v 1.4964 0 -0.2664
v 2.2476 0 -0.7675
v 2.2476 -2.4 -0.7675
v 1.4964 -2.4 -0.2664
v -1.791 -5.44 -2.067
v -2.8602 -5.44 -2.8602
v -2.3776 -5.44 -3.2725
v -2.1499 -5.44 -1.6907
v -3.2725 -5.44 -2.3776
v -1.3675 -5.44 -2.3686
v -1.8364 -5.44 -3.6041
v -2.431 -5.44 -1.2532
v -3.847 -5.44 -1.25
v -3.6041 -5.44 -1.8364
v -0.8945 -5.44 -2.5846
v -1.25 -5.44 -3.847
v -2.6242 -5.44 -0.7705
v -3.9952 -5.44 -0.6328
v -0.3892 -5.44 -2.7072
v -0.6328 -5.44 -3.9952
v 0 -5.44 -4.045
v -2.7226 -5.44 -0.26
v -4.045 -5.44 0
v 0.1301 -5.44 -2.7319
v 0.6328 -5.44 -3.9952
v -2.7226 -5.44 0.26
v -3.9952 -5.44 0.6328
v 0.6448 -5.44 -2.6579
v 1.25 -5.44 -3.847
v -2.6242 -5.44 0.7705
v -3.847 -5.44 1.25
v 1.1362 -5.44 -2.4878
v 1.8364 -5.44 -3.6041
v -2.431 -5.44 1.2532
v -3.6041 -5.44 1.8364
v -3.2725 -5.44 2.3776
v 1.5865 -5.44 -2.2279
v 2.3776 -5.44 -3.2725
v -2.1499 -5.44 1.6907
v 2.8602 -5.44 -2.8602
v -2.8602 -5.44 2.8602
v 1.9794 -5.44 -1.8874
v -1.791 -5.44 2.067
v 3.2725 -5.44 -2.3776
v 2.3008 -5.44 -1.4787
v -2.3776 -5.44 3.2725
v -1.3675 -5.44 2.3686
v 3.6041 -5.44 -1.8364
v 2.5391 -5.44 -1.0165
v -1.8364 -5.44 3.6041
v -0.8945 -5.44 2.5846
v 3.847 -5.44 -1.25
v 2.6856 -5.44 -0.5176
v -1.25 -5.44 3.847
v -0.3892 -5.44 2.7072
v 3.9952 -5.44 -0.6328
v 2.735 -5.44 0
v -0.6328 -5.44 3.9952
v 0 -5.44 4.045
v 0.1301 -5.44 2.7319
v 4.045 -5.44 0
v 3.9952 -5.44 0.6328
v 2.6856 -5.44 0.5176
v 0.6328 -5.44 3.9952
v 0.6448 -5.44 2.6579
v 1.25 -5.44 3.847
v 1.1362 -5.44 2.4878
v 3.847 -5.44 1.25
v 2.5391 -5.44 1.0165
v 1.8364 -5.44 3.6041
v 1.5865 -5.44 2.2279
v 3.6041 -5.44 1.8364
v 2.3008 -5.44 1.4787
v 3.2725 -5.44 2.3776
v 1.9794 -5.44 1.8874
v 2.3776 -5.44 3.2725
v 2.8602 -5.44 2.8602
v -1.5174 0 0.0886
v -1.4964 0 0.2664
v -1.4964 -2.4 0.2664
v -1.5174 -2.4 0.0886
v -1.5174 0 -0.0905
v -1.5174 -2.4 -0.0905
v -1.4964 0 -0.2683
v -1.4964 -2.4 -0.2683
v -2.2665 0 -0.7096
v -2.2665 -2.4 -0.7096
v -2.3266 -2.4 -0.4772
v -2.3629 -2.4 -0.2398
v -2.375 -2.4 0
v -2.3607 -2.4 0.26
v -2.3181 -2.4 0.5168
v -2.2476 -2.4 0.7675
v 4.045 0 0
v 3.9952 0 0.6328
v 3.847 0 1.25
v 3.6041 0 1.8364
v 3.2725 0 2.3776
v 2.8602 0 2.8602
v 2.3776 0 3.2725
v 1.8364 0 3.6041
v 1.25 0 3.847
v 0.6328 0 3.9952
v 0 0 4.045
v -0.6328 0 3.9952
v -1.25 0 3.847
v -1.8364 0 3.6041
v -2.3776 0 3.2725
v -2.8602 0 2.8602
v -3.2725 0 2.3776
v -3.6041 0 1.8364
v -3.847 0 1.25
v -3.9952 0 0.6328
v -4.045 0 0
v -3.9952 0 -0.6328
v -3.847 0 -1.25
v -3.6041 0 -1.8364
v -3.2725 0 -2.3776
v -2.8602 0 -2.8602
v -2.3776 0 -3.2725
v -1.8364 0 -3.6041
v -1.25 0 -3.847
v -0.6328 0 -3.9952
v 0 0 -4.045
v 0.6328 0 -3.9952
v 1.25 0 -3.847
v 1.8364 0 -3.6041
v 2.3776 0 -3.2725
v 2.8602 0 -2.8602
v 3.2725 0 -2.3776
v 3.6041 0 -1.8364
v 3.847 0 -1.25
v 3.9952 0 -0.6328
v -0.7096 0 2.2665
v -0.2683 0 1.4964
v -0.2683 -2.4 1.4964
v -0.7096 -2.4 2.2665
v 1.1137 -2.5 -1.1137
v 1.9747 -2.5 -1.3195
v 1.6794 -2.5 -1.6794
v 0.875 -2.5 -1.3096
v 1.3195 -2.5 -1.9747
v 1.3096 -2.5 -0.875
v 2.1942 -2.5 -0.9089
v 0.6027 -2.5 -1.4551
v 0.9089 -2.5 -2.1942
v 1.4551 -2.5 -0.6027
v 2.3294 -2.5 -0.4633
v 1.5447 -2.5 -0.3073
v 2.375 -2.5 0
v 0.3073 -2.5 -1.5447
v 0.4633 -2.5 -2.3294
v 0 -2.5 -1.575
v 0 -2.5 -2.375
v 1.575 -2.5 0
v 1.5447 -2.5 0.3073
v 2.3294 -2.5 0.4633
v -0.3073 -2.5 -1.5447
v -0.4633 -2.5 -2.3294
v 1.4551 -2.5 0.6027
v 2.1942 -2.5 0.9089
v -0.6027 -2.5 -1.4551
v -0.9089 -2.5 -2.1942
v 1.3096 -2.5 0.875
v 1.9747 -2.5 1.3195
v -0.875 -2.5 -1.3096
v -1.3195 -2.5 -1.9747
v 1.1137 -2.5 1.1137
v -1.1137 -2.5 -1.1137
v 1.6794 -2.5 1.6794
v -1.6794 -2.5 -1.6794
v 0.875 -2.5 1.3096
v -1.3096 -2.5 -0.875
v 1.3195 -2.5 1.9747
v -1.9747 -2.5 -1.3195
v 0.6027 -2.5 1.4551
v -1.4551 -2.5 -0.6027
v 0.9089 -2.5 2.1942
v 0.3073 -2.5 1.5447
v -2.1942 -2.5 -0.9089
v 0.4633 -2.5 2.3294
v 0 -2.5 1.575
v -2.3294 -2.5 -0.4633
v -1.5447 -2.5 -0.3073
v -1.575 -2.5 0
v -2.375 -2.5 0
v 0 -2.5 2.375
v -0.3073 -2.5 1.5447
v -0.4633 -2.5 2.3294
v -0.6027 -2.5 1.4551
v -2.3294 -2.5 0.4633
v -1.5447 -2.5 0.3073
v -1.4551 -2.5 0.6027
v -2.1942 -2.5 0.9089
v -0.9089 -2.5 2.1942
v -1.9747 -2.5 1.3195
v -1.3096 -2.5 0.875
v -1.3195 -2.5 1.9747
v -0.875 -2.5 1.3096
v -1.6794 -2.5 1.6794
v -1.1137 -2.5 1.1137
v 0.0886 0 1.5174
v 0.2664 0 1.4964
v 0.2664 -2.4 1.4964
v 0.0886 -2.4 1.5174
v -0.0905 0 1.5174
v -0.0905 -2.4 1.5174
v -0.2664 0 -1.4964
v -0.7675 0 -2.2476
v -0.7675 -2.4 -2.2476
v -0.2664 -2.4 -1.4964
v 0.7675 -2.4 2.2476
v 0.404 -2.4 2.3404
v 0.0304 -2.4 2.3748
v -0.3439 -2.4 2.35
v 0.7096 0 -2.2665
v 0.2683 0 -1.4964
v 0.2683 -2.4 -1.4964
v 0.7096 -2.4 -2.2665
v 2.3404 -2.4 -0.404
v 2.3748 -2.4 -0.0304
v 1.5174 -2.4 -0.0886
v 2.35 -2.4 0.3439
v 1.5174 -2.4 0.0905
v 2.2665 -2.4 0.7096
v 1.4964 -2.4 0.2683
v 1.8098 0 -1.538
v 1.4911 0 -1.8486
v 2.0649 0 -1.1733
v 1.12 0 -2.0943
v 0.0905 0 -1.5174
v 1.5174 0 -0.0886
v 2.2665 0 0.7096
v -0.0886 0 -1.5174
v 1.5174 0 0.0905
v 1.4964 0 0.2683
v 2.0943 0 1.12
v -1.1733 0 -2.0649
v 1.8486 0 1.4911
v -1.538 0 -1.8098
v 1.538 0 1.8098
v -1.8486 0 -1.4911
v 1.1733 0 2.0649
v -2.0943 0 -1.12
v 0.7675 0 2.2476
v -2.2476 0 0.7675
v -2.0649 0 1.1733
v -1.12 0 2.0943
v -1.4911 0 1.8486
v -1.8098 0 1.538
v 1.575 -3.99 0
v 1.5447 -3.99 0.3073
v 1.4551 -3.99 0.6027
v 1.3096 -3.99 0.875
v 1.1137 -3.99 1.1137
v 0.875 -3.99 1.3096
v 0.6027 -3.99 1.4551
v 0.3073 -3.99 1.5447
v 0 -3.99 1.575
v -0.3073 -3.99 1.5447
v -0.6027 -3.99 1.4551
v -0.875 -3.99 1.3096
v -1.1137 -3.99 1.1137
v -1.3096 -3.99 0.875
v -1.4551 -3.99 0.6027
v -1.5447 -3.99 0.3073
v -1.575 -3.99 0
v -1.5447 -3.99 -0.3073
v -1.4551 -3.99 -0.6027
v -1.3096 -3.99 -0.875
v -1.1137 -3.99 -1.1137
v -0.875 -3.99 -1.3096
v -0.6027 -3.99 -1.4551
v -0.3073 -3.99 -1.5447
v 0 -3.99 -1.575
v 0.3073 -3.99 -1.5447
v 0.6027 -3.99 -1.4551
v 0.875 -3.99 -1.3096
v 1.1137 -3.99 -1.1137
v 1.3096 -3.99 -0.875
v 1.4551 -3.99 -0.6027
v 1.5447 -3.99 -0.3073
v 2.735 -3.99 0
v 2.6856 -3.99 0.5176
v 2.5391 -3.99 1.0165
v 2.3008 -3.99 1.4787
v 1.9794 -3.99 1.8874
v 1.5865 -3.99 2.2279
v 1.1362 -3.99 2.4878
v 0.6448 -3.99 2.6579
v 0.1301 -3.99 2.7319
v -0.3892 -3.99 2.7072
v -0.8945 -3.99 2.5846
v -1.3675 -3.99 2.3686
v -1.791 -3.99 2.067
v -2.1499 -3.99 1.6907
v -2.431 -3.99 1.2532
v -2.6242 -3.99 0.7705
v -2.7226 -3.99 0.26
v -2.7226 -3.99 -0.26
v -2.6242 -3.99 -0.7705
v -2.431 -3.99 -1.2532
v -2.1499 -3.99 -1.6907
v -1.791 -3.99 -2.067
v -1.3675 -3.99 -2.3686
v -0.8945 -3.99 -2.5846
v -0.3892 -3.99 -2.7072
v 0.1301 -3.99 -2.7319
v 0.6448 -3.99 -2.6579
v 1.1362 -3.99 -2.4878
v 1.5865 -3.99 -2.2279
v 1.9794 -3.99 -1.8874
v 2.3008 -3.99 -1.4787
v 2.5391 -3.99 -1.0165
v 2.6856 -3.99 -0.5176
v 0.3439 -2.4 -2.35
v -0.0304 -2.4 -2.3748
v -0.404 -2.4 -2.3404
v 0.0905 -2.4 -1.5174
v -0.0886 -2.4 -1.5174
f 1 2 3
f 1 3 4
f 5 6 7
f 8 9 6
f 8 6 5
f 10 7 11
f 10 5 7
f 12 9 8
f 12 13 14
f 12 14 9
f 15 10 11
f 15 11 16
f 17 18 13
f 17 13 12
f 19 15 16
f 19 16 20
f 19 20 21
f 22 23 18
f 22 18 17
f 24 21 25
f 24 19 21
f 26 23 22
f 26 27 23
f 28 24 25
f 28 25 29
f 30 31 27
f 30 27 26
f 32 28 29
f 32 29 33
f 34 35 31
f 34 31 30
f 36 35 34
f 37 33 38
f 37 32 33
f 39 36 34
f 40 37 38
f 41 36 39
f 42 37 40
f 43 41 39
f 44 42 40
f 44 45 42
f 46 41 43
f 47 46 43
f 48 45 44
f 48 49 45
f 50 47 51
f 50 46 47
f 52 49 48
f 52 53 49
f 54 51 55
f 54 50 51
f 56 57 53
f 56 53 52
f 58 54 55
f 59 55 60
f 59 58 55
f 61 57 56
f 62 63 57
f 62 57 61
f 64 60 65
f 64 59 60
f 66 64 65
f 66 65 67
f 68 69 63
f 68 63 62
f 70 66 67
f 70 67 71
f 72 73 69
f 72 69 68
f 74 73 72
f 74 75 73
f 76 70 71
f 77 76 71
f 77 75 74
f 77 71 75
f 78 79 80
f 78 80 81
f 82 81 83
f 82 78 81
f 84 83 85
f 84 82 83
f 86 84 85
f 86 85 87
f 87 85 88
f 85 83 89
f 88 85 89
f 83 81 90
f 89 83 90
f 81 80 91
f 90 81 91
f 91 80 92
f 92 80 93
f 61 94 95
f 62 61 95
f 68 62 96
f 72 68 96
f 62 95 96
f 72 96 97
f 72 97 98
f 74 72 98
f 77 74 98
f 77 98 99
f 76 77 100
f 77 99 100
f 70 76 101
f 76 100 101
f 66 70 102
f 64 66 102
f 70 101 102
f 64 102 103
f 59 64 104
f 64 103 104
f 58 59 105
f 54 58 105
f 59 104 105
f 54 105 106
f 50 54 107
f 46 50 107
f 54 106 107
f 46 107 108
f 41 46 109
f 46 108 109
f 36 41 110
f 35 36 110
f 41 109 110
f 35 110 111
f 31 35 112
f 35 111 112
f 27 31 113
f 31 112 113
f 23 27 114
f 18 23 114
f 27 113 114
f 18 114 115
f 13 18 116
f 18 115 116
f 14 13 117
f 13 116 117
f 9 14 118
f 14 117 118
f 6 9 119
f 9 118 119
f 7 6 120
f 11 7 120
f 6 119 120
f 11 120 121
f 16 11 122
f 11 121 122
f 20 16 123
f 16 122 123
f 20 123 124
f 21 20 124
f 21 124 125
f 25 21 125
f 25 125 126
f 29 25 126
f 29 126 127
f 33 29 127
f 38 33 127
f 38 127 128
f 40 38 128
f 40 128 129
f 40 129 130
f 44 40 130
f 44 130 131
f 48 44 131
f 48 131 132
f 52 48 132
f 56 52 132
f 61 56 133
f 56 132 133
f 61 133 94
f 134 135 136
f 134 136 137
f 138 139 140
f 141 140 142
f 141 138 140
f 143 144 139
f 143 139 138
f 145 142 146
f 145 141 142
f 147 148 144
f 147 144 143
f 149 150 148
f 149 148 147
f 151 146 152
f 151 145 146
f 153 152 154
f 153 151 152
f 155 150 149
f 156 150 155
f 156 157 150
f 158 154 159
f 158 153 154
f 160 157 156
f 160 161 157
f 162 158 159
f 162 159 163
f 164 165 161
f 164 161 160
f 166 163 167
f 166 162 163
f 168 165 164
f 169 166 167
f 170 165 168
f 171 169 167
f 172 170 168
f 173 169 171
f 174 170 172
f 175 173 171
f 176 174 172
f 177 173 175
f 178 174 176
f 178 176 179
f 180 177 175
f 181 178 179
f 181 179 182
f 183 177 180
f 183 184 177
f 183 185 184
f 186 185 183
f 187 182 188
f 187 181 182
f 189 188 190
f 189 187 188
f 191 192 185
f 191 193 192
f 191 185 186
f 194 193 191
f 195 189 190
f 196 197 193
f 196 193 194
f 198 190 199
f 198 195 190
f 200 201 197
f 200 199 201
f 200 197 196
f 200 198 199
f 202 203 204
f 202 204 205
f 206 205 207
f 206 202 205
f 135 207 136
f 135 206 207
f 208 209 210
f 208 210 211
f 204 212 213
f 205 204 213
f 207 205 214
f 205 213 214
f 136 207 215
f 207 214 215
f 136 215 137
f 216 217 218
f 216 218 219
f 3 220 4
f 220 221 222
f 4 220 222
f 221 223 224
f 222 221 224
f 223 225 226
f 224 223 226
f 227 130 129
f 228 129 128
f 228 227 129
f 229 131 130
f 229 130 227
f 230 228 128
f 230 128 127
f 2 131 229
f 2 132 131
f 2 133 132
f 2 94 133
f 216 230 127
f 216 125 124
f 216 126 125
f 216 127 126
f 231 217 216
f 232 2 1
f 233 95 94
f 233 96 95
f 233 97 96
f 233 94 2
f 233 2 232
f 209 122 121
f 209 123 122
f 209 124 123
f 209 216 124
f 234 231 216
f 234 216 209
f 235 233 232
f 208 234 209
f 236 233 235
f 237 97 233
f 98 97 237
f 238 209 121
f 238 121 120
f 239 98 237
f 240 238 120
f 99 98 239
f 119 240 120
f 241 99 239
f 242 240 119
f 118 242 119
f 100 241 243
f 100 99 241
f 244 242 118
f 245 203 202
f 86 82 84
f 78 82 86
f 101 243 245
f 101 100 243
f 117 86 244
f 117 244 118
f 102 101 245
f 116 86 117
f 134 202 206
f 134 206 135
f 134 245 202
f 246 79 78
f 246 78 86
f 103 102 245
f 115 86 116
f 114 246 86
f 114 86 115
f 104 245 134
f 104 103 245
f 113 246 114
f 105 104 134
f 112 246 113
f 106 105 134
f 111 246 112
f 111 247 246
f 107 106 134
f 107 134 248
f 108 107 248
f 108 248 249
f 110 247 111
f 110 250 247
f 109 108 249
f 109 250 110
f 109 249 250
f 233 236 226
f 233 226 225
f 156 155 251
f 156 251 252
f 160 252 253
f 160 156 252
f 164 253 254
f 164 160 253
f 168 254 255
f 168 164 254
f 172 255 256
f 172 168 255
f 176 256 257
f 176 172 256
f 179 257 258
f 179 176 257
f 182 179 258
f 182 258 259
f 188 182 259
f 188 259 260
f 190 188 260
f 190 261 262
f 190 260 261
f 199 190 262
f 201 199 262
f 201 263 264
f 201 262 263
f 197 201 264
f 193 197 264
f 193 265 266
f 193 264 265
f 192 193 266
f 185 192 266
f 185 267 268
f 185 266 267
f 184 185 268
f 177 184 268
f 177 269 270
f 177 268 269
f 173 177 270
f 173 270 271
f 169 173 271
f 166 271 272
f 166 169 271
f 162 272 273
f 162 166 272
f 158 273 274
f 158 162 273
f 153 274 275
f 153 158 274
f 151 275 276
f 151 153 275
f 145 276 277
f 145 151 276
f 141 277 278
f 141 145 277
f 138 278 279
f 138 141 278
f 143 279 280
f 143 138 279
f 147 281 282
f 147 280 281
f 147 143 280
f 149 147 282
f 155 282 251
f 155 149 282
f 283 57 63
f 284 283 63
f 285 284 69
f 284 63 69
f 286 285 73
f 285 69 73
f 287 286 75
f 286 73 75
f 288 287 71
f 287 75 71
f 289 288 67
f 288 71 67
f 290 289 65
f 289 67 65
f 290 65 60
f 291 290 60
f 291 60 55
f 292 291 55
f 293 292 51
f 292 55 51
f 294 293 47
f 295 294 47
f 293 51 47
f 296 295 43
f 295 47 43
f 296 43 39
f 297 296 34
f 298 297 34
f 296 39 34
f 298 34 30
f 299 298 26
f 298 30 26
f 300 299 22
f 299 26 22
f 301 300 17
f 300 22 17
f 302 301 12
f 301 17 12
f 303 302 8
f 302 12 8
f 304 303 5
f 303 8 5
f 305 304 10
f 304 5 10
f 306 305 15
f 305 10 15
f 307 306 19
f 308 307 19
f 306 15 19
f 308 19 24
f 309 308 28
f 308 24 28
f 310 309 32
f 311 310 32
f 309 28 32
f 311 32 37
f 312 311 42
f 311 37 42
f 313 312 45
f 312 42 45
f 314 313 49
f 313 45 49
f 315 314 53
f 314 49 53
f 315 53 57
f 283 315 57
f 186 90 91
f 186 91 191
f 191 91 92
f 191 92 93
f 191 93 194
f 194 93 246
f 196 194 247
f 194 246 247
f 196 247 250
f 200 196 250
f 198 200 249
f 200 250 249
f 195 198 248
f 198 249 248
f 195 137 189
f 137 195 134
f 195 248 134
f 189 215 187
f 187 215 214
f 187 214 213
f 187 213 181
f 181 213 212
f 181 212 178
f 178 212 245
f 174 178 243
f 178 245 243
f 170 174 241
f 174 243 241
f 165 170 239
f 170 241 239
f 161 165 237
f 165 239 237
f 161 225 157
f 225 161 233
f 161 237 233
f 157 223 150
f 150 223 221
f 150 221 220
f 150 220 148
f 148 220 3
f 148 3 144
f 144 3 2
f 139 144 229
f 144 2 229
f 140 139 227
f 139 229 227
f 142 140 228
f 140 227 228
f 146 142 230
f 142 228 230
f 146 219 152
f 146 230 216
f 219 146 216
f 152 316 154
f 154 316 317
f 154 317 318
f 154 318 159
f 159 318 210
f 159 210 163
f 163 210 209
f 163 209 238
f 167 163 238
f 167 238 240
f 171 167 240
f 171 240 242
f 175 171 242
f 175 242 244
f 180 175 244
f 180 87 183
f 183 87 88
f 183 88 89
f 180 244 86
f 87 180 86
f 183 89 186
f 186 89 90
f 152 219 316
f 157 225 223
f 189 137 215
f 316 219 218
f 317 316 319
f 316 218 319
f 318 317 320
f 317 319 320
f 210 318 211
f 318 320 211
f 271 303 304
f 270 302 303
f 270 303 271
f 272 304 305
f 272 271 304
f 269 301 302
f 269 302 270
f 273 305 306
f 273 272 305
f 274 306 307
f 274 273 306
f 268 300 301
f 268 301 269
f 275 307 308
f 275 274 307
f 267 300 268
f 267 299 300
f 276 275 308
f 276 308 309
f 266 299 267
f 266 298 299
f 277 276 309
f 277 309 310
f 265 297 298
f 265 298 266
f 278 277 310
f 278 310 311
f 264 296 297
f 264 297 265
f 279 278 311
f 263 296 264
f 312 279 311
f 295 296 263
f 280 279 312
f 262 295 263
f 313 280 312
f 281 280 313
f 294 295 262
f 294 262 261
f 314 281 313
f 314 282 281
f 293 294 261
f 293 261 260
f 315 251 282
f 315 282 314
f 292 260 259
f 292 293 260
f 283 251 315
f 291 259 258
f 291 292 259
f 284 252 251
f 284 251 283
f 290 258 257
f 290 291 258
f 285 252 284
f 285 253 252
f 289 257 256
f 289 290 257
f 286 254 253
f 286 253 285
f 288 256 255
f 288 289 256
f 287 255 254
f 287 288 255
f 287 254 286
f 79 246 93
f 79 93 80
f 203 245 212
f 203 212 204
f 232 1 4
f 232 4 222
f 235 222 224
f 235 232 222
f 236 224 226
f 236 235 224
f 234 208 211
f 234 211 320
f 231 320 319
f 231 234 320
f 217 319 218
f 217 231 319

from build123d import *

# Parameters (mm, degrees)
F0_R     = 4.045
F0_R_2   = 1.575
F1_DEPTH = 5.44
F2_R     = 2.735
F3_DEPTH = 1.45
F4_R     = 2.375
F5_DEPTH = 2.5
F7_DEPTH = 2.4


with BuildPart() as f1:
    # F0 (on Front) → F1 (new body)
    with BuildSketch(Plane.XZ):
        Circle(F0_R)
        Circle(F0_R_2, mode=Mode.SUBTRACT)
    extrude(amount=F1_DEPTH)

    # F2 (on face) → F3 (cut)
    with BuildSketch(Plane.XZ.offset(5.44)):
        Circle(F2_R)
    extrude(amount=-F3_DEPTH, mode=Mode.SUBTRACT)

    # F4 (on face) → F5 (cut)
    with BuildSketch(Plane(origin=(0, 0, 0), x_dir=(-1, 0, 0), z_dir=(0, 1, 0))):
        Circle(F4_R)
    extrude(amount=-F5_DEPTH, mode=Mode.SUBTRACT)

    # F6 (on face) → F7 (join)
    with BuildSketch(Plane(origin=(0, 0, 0), x_dir=(-1, 0, 0), z_dir=(0, 1, 0))):
        with BuildLine():
            Line((1.4963533031, -0.268314818), (2.2665058776, -0.7096309653))
            ThreePointArc((2.2665058776, -0.7096309653), (2.3477197937, -0.3589383936), (2.375, 0))
            ThreePointArc((2.375, 0), (2.342926602, 0.3889986346), (2.247572684, 0.7674907361))
            Line((2.247572684, 0.7674907361), (1.4963533031, 0.266433459))
            ThreePointArc((1.4963533031, 0.266433459), (1.520064106, -0.0009406795), (1.4963533031, -0.268314818))
        make_face()
        with BuildLine():
            ThreePointArc((-0.7096309653, -2.2665058776), (0.0304393614, -2.3748049278), (0.7674907361, -2.247572684))
            Line((0.7674907361, -2.247572684), (0.266433459, -1.4963533031))
            ThreePointArc((0.266433459, -1.4963533031), (-0.0009406795, -1.520064106), (-0.268314818, -1.4963533031))
            Line((-0.268314818, -1.4963533031), (-0.7096309653, -2.2665058776))
        make_face()
        with BuildLine():
            ThreePointArc((-2.2665058776, 0.7096309653), (-2.3748049278, -0.0304393614), (-2.247572684, -0.7674907361))
            Line((-2.247572684, -0.7674907361), (-1.4963533031, -0.266433459))
            ThreePointArc((-1.4963533031, -0.266433459), (-1.520064106, 0.0009406795), (-1.4963533031, 0.268314818))
            Line((-1.4963533031, 0.268314818), (-2.2665058776, 0.7096309653))
        make_face()
        with BuildLine():
            ThreePointArc((0.7096309653, 2.2665058776), (-0.0304393614, 2.3748049278), (-0.7674907361, 2.247572684))
            Line((-0.7674907361, 2.247572684), (-0.266433459, 1.4963533031))
            ThreePointArc((-0.266433459, 1.4963533031), (0.0009406795, 1.520064106), (0.268314818, 1.4963533031))
            Line((0.268314818, 1.4963533031), (0.7096309653, 2.2665058776))
        make_face()
    extrude(amount=-F7_DEPTH)


solid = f1.part
